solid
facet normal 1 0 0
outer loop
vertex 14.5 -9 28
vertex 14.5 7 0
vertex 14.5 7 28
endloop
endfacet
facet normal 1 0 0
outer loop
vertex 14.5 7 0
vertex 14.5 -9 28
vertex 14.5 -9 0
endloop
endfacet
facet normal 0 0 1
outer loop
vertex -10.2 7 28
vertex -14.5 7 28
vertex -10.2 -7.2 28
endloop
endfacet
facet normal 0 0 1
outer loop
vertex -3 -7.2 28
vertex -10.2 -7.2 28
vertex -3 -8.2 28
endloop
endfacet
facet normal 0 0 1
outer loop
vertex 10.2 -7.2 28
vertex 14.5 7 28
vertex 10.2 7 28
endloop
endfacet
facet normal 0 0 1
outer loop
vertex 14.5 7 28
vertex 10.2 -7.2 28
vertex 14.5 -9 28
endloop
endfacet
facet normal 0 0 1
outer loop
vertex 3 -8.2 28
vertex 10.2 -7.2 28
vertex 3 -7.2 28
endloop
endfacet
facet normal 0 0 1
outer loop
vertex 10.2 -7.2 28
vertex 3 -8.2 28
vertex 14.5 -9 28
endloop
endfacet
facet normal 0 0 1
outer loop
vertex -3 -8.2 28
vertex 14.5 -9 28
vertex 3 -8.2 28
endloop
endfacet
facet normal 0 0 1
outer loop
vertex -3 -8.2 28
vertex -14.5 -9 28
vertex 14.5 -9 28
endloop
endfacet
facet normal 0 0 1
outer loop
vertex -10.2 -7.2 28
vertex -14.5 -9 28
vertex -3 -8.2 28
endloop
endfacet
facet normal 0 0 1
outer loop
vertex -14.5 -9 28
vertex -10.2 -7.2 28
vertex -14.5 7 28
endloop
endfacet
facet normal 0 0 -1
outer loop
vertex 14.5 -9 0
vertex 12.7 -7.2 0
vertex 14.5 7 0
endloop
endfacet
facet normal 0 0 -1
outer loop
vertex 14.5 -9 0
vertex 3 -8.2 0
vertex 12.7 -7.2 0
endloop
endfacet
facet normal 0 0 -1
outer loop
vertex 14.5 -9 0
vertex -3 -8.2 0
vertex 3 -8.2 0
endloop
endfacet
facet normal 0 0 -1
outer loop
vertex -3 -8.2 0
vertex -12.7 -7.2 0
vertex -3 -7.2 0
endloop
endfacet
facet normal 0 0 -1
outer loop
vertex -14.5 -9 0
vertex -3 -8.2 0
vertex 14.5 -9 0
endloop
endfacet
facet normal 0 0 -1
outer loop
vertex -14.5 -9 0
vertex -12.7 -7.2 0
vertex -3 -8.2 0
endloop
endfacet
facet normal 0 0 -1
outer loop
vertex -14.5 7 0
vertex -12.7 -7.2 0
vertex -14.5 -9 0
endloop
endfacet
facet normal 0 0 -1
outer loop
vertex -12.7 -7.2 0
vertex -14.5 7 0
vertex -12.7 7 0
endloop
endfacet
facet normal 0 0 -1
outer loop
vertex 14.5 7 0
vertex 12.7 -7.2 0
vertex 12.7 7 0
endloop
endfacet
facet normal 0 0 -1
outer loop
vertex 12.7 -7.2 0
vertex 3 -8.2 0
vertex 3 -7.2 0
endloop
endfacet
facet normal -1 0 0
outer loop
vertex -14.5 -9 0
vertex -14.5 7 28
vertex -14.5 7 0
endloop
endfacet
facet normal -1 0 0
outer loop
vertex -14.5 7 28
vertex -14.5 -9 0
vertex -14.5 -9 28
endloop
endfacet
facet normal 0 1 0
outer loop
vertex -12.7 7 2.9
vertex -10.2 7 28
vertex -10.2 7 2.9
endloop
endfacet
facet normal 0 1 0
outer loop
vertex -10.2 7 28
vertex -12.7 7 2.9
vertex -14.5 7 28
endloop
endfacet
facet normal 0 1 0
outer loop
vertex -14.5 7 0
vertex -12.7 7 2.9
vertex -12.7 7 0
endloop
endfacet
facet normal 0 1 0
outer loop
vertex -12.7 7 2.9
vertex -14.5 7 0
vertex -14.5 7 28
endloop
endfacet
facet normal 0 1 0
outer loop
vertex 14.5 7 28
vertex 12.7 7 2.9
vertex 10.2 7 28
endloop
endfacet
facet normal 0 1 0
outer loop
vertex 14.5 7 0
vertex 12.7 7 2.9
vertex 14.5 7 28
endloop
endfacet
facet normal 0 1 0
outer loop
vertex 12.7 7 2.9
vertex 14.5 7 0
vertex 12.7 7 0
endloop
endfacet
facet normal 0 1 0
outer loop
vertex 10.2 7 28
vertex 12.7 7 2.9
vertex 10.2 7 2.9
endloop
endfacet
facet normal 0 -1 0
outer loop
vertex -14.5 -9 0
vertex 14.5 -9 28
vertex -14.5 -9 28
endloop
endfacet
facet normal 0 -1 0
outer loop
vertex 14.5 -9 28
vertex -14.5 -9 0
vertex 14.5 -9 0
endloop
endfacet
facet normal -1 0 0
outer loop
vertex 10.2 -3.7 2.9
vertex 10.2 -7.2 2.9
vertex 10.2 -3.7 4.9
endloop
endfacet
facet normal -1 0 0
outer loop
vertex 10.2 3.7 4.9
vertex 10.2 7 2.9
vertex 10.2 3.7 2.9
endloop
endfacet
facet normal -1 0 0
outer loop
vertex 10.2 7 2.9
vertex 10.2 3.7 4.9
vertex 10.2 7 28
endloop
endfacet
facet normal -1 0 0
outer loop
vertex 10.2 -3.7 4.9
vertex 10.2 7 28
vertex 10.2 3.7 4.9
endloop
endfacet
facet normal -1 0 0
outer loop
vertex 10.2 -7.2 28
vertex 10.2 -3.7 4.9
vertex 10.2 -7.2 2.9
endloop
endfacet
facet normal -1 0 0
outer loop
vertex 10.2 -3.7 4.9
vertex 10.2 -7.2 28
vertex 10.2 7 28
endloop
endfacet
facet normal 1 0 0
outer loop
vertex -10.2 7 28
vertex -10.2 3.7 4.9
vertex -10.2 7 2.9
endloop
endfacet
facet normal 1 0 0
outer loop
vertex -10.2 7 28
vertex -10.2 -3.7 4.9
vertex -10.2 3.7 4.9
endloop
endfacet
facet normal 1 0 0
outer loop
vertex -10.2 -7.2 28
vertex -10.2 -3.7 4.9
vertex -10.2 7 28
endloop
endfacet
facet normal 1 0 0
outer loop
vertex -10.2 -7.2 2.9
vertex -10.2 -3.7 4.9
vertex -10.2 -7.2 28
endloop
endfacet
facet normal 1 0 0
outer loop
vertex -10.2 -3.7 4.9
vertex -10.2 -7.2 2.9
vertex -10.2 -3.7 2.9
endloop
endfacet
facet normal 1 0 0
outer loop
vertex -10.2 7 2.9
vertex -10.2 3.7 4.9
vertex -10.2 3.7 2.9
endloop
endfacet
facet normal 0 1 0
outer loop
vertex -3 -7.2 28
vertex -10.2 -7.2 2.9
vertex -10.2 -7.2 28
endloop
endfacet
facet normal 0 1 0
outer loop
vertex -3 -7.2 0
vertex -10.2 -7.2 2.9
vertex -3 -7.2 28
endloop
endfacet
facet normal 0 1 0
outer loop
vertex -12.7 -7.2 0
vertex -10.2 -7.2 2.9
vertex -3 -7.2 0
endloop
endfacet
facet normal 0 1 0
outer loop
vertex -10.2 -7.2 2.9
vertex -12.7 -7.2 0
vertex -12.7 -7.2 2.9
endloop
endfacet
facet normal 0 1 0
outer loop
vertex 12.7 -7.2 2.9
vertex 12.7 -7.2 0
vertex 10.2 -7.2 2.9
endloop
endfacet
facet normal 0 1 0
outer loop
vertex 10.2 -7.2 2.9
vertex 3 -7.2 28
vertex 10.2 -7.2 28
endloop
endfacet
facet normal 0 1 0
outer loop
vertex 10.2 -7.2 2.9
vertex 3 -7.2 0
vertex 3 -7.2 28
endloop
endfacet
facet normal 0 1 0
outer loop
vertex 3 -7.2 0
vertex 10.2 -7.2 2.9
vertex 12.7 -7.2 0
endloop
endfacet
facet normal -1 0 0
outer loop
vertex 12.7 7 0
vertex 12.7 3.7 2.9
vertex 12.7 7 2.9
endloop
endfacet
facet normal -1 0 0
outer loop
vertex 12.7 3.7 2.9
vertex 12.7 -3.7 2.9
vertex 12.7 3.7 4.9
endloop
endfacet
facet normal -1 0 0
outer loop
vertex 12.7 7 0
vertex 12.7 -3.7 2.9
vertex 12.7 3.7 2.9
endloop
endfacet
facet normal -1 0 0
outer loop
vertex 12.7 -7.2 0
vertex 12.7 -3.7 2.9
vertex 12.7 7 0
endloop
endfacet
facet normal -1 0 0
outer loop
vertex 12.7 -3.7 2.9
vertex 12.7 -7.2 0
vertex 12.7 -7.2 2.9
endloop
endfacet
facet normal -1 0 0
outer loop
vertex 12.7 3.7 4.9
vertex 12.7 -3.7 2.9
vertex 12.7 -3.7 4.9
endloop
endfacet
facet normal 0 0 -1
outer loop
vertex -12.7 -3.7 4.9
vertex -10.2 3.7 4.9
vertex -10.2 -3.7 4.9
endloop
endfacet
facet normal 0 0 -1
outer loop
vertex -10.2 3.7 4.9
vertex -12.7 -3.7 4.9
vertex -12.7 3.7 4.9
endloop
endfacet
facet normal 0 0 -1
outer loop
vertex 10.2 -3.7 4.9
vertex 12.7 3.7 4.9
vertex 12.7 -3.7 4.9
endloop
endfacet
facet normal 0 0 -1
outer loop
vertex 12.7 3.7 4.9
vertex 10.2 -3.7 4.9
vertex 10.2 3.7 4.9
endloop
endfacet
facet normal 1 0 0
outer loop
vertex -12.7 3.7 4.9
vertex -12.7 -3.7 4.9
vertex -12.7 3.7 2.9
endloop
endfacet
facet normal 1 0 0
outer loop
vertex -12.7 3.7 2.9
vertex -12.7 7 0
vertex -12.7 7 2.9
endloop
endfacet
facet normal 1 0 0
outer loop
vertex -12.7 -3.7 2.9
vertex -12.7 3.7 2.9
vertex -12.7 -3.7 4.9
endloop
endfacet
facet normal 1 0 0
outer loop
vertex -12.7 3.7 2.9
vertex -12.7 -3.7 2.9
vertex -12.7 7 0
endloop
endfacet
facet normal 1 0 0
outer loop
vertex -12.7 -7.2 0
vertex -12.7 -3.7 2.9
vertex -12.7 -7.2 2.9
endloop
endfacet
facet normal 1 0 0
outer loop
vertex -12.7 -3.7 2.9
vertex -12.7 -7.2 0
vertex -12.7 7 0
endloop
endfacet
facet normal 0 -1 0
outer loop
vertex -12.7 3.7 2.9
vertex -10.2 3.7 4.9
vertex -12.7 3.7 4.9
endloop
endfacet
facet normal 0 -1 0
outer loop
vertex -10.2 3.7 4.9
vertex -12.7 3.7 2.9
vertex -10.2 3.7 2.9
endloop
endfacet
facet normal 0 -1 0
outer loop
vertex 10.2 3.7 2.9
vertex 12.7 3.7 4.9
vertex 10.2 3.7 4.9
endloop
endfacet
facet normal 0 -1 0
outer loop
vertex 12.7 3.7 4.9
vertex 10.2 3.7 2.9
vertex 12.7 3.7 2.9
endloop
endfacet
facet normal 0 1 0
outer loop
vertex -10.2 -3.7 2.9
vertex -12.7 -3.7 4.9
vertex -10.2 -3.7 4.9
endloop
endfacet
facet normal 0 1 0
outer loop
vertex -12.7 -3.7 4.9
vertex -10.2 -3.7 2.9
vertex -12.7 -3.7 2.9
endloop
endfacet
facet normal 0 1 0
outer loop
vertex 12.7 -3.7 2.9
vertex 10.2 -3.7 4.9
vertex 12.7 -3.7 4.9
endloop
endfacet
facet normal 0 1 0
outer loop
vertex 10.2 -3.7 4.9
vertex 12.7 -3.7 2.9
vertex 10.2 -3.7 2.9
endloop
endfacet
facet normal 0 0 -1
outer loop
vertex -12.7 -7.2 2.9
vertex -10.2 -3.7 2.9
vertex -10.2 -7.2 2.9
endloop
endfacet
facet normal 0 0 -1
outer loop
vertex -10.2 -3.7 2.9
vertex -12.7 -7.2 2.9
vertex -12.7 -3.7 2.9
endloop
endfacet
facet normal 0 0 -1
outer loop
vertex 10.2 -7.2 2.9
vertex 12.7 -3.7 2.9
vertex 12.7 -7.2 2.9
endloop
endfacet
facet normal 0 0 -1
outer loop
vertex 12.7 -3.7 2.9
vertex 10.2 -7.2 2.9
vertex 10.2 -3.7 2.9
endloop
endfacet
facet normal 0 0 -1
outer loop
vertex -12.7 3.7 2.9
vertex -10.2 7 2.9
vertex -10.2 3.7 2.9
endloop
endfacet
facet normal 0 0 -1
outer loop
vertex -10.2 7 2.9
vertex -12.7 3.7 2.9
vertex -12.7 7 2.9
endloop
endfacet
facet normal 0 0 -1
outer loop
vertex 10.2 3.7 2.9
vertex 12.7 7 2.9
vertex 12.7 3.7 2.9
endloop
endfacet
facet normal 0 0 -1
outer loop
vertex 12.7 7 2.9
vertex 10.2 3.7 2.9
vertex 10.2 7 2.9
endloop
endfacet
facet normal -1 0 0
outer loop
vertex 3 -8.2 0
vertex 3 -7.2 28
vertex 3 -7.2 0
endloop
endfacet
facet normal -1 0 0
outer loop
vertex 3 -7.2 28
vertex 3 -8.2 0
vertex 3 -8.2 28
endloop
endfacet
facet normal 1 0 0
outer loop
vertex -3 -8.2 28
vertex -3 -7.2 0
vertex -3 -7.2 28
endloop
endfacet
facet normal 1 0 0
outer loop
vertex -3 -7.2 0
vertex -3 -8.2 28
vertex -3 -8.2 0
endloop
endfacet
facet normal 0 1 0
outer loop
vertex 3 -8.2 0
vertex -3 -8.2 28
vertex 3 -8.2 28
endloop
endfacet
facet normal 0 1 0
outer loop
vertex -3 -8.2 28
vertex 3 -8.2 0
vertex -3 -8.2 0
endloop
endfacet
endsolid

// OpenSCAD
$fn=100;

//print_error = 0.0;
print_error = 0.2;

motor_fix(print_error=print_error);
//rod_fix(print_error=print_error);
//frame_fix(print_error=print_error);

/**
 * Крепление для мотора-редуктора popolu.
 */
module motor_fix(print_error=0) {
  // главный блок с шестеренками
  mlenx_1 = 20;
  // защелка
  mlenx_2 = 25;
  // рамка
  mlenx_3 = 25;
  // блок с мотором
  mlenx_4 = 23;
    
  // главный блок с шестеренками
  mleny_1 = 14;
  // защелка
  mleny_2 = 7;
  // рамка
  mleny_3 = 14;
  // блок с мотором
  mleny_4 = 12;
  
  // защелка
  mlenz_2 = 2;
  // рамка
  mlenz_3 = 3;
    
  // всё центрируем по x и по y
  difference() {
    union() {
      // по ширине рамки + стенки 2мм
      translate([-(mlenx_3+4)/2, -mleny_1/2-2, 0]) cube([mlenx_3+4, mleny_1+2, 28]);
      // крепления на корпус
      linear_extrude(height=2) import(file="крепление-мотор-43d.dxf");
    }
    // главный блок с шестеренками
    translate([-mlenx_1/2-print_error, -mleny_1/2-print_error, -0.1]) 
      cube([mlenx_1+print_error*2, mleny_1+print_error*2+0.1, 28+0.2]);
    // защелки
    translate([-mlenx_2/2-print_error, -mleny_2/2-print_error, -0.1]) 
      cube([mlenx_2+print_error*2, mleny_2+print_error*2, mlenz_3+mlenz_2]);
    // рамка вокруг мотора
    translate([-mlenx_3/2-print_error, -mleny_3/2-print_error, -0.1]) 
      cube([mlenx_3+print_error*2, mleny_3+print_error*2+0.1, mlenz_3]);
    
    // канавка по внутренней поверхности задней стенки
    translate([-6/2, -mleny_1/2-print_error-1, -0.1])
      cube([6, 1+0.1, 30+0.2]);
    
    // рассверлить отверстия под винты с учетом print_error
    // справа
    translate([23+2, 0+2, -0.1]) cylinder(h=3+0.2, r=2+print_error);
    translate([23+2, -10+2, -0.1]) cylinder(h=3+0.2, r=2+print_error);
    translate([23+2, -20+2, -0.1]) cylinder(h=3+0.2, r=2+print_error);
    translate([13+2, -20+2, -0.1]) cylinder(h=3+0.2, r=2+print_error);
    translate([3+2, -20+2, -0.1]) cylinder(h=3+0.2, r=2+print_error);
    // слева
    translate([-(23+2), 0+2, -0.1]) cylinder(h=3+0.2, r=2+print_error);
    translate([-(23+2), -10+2, -0.1]) cylinder(h=3+0.2, r=2+print_error);
    translate([-(23+2), -20+2, -0.1]) cylinder(h=3+0.2, r=2+print_error);
    translate([-(13+2), -20+2, -0.1]) cylinder(h=3+0.2, r=2+print_error);
    translate([-(3+2), -20+2, -0.1]) cylinder(h=3+0.2, r=2+print_error);
  }
}

/**
 * Крепление для оси
 */
module rod_fix(print_error=0) {
  rod_fix_lenx = 20;
  rod_fix_leny = 20;
  difference() {
    linear_extrude(height=3) import(file="крепление-ось-43d.dxf");
    
    // круглая ось
    translate([-0.1, rod_fix_leny/2, 1]) rotate([0, 90, 0]) 
      cylinder(r=1+print_error, h=rod_fix_lenx+0.2, $fn=100);
    // прямоугольный выход
    translate([-0.1, rod_fix_leny/2-1-print_error, -0.1]) 
      cube([rod_fix_lenx+0.2, 2+print_error*2, 1+0.1]);
      
    // рассверлить отверстия под винты с учетом print_error
    translate([3+2, 3+2, -0.1]) cylinder(h=3+0.2, r=2+print_error);
    translate([3+4+6+2, 3+2, -0.1]) cylinder(h=3+0.2, r=2+print_error);
    translate([3+2, 3+4+6+2, -0.1]) cylinder(h=3+0.2, r=2+print_error);
    translate([3+4+6+2, 3+4+6+2, -0.1]) cylinder(h=3+0.2, r=2+print_error);
  }
}

/**
 * Вертикальные крепления рамы корпуса.
 */
module frame_fix(print_error=0) {
  difference() {
    union() {
      cube([30, 2, 28]);
      cube([30, 3+4+3, 2]);
      translate([0, 0, 28-2])
        cube([30, 3+4+3, 2]);
    }
    
    // вертикальные дырки для винтов
    translate([3+2, 3+2, -0.1])
      cylinder(h=28+0.2, r=2+print_error);
    translate([3+2+10, 3+2, -0.1])
      cylinder(h=28+0.2, r=2+print_error);
    translate([3+2+10+10, 3+2, -0.1])
      cylinder(h=28+0.2, r=2+print_error);
    
    // вертикальные канавки в стенках для шляпок
    translate([3+2, 3+2, 2])
      cylinder(h=28-4, r=4+print_error);
    translate([3+2+10, 3+2, 2])
      cylinder(h=28-4, r=4+print_error);
    translate([3+2+10+10, 3+2, 2])
      cylinder(h=28-4, r=4+print_error);
    
    // горизонтальные дырки в стенах для винтов просто так
    // нижний ряд
    translate([3+2, -0.1, 2+3+2])
      rotate([-90,0,0]) cylinder(h=2+0.2, r=2+print_error);
    translate([3+2+10, -0.1, 2+3+2])
      rotate([-90,0,0]) cylinder(h=2+0.2, r=2+print_error);
    translate([3+2+10+10, -0.1, 2+3+2])
      rotate([-90,0,0]) cylinder(h=2+0.2, r=2+print_error);
    // второй снизу ряд
    translate([3+2, -0.1, 2+3+2+10])
      rotate([-90,0,0]) cylinder(h=2+0.2, r=2+print_error);
    translate([3+2+10, -0.1, 2+3+2+10])
      rotate([-90,0,0]) cylinder(h=2+0.2, r=2+print_error);
    translate([3+2+10+10, -0.1, 2+3+2+10])
      rotate([-90,0,0]) cylinder(h=2+0.2, r=2+print_error);
  }
}
